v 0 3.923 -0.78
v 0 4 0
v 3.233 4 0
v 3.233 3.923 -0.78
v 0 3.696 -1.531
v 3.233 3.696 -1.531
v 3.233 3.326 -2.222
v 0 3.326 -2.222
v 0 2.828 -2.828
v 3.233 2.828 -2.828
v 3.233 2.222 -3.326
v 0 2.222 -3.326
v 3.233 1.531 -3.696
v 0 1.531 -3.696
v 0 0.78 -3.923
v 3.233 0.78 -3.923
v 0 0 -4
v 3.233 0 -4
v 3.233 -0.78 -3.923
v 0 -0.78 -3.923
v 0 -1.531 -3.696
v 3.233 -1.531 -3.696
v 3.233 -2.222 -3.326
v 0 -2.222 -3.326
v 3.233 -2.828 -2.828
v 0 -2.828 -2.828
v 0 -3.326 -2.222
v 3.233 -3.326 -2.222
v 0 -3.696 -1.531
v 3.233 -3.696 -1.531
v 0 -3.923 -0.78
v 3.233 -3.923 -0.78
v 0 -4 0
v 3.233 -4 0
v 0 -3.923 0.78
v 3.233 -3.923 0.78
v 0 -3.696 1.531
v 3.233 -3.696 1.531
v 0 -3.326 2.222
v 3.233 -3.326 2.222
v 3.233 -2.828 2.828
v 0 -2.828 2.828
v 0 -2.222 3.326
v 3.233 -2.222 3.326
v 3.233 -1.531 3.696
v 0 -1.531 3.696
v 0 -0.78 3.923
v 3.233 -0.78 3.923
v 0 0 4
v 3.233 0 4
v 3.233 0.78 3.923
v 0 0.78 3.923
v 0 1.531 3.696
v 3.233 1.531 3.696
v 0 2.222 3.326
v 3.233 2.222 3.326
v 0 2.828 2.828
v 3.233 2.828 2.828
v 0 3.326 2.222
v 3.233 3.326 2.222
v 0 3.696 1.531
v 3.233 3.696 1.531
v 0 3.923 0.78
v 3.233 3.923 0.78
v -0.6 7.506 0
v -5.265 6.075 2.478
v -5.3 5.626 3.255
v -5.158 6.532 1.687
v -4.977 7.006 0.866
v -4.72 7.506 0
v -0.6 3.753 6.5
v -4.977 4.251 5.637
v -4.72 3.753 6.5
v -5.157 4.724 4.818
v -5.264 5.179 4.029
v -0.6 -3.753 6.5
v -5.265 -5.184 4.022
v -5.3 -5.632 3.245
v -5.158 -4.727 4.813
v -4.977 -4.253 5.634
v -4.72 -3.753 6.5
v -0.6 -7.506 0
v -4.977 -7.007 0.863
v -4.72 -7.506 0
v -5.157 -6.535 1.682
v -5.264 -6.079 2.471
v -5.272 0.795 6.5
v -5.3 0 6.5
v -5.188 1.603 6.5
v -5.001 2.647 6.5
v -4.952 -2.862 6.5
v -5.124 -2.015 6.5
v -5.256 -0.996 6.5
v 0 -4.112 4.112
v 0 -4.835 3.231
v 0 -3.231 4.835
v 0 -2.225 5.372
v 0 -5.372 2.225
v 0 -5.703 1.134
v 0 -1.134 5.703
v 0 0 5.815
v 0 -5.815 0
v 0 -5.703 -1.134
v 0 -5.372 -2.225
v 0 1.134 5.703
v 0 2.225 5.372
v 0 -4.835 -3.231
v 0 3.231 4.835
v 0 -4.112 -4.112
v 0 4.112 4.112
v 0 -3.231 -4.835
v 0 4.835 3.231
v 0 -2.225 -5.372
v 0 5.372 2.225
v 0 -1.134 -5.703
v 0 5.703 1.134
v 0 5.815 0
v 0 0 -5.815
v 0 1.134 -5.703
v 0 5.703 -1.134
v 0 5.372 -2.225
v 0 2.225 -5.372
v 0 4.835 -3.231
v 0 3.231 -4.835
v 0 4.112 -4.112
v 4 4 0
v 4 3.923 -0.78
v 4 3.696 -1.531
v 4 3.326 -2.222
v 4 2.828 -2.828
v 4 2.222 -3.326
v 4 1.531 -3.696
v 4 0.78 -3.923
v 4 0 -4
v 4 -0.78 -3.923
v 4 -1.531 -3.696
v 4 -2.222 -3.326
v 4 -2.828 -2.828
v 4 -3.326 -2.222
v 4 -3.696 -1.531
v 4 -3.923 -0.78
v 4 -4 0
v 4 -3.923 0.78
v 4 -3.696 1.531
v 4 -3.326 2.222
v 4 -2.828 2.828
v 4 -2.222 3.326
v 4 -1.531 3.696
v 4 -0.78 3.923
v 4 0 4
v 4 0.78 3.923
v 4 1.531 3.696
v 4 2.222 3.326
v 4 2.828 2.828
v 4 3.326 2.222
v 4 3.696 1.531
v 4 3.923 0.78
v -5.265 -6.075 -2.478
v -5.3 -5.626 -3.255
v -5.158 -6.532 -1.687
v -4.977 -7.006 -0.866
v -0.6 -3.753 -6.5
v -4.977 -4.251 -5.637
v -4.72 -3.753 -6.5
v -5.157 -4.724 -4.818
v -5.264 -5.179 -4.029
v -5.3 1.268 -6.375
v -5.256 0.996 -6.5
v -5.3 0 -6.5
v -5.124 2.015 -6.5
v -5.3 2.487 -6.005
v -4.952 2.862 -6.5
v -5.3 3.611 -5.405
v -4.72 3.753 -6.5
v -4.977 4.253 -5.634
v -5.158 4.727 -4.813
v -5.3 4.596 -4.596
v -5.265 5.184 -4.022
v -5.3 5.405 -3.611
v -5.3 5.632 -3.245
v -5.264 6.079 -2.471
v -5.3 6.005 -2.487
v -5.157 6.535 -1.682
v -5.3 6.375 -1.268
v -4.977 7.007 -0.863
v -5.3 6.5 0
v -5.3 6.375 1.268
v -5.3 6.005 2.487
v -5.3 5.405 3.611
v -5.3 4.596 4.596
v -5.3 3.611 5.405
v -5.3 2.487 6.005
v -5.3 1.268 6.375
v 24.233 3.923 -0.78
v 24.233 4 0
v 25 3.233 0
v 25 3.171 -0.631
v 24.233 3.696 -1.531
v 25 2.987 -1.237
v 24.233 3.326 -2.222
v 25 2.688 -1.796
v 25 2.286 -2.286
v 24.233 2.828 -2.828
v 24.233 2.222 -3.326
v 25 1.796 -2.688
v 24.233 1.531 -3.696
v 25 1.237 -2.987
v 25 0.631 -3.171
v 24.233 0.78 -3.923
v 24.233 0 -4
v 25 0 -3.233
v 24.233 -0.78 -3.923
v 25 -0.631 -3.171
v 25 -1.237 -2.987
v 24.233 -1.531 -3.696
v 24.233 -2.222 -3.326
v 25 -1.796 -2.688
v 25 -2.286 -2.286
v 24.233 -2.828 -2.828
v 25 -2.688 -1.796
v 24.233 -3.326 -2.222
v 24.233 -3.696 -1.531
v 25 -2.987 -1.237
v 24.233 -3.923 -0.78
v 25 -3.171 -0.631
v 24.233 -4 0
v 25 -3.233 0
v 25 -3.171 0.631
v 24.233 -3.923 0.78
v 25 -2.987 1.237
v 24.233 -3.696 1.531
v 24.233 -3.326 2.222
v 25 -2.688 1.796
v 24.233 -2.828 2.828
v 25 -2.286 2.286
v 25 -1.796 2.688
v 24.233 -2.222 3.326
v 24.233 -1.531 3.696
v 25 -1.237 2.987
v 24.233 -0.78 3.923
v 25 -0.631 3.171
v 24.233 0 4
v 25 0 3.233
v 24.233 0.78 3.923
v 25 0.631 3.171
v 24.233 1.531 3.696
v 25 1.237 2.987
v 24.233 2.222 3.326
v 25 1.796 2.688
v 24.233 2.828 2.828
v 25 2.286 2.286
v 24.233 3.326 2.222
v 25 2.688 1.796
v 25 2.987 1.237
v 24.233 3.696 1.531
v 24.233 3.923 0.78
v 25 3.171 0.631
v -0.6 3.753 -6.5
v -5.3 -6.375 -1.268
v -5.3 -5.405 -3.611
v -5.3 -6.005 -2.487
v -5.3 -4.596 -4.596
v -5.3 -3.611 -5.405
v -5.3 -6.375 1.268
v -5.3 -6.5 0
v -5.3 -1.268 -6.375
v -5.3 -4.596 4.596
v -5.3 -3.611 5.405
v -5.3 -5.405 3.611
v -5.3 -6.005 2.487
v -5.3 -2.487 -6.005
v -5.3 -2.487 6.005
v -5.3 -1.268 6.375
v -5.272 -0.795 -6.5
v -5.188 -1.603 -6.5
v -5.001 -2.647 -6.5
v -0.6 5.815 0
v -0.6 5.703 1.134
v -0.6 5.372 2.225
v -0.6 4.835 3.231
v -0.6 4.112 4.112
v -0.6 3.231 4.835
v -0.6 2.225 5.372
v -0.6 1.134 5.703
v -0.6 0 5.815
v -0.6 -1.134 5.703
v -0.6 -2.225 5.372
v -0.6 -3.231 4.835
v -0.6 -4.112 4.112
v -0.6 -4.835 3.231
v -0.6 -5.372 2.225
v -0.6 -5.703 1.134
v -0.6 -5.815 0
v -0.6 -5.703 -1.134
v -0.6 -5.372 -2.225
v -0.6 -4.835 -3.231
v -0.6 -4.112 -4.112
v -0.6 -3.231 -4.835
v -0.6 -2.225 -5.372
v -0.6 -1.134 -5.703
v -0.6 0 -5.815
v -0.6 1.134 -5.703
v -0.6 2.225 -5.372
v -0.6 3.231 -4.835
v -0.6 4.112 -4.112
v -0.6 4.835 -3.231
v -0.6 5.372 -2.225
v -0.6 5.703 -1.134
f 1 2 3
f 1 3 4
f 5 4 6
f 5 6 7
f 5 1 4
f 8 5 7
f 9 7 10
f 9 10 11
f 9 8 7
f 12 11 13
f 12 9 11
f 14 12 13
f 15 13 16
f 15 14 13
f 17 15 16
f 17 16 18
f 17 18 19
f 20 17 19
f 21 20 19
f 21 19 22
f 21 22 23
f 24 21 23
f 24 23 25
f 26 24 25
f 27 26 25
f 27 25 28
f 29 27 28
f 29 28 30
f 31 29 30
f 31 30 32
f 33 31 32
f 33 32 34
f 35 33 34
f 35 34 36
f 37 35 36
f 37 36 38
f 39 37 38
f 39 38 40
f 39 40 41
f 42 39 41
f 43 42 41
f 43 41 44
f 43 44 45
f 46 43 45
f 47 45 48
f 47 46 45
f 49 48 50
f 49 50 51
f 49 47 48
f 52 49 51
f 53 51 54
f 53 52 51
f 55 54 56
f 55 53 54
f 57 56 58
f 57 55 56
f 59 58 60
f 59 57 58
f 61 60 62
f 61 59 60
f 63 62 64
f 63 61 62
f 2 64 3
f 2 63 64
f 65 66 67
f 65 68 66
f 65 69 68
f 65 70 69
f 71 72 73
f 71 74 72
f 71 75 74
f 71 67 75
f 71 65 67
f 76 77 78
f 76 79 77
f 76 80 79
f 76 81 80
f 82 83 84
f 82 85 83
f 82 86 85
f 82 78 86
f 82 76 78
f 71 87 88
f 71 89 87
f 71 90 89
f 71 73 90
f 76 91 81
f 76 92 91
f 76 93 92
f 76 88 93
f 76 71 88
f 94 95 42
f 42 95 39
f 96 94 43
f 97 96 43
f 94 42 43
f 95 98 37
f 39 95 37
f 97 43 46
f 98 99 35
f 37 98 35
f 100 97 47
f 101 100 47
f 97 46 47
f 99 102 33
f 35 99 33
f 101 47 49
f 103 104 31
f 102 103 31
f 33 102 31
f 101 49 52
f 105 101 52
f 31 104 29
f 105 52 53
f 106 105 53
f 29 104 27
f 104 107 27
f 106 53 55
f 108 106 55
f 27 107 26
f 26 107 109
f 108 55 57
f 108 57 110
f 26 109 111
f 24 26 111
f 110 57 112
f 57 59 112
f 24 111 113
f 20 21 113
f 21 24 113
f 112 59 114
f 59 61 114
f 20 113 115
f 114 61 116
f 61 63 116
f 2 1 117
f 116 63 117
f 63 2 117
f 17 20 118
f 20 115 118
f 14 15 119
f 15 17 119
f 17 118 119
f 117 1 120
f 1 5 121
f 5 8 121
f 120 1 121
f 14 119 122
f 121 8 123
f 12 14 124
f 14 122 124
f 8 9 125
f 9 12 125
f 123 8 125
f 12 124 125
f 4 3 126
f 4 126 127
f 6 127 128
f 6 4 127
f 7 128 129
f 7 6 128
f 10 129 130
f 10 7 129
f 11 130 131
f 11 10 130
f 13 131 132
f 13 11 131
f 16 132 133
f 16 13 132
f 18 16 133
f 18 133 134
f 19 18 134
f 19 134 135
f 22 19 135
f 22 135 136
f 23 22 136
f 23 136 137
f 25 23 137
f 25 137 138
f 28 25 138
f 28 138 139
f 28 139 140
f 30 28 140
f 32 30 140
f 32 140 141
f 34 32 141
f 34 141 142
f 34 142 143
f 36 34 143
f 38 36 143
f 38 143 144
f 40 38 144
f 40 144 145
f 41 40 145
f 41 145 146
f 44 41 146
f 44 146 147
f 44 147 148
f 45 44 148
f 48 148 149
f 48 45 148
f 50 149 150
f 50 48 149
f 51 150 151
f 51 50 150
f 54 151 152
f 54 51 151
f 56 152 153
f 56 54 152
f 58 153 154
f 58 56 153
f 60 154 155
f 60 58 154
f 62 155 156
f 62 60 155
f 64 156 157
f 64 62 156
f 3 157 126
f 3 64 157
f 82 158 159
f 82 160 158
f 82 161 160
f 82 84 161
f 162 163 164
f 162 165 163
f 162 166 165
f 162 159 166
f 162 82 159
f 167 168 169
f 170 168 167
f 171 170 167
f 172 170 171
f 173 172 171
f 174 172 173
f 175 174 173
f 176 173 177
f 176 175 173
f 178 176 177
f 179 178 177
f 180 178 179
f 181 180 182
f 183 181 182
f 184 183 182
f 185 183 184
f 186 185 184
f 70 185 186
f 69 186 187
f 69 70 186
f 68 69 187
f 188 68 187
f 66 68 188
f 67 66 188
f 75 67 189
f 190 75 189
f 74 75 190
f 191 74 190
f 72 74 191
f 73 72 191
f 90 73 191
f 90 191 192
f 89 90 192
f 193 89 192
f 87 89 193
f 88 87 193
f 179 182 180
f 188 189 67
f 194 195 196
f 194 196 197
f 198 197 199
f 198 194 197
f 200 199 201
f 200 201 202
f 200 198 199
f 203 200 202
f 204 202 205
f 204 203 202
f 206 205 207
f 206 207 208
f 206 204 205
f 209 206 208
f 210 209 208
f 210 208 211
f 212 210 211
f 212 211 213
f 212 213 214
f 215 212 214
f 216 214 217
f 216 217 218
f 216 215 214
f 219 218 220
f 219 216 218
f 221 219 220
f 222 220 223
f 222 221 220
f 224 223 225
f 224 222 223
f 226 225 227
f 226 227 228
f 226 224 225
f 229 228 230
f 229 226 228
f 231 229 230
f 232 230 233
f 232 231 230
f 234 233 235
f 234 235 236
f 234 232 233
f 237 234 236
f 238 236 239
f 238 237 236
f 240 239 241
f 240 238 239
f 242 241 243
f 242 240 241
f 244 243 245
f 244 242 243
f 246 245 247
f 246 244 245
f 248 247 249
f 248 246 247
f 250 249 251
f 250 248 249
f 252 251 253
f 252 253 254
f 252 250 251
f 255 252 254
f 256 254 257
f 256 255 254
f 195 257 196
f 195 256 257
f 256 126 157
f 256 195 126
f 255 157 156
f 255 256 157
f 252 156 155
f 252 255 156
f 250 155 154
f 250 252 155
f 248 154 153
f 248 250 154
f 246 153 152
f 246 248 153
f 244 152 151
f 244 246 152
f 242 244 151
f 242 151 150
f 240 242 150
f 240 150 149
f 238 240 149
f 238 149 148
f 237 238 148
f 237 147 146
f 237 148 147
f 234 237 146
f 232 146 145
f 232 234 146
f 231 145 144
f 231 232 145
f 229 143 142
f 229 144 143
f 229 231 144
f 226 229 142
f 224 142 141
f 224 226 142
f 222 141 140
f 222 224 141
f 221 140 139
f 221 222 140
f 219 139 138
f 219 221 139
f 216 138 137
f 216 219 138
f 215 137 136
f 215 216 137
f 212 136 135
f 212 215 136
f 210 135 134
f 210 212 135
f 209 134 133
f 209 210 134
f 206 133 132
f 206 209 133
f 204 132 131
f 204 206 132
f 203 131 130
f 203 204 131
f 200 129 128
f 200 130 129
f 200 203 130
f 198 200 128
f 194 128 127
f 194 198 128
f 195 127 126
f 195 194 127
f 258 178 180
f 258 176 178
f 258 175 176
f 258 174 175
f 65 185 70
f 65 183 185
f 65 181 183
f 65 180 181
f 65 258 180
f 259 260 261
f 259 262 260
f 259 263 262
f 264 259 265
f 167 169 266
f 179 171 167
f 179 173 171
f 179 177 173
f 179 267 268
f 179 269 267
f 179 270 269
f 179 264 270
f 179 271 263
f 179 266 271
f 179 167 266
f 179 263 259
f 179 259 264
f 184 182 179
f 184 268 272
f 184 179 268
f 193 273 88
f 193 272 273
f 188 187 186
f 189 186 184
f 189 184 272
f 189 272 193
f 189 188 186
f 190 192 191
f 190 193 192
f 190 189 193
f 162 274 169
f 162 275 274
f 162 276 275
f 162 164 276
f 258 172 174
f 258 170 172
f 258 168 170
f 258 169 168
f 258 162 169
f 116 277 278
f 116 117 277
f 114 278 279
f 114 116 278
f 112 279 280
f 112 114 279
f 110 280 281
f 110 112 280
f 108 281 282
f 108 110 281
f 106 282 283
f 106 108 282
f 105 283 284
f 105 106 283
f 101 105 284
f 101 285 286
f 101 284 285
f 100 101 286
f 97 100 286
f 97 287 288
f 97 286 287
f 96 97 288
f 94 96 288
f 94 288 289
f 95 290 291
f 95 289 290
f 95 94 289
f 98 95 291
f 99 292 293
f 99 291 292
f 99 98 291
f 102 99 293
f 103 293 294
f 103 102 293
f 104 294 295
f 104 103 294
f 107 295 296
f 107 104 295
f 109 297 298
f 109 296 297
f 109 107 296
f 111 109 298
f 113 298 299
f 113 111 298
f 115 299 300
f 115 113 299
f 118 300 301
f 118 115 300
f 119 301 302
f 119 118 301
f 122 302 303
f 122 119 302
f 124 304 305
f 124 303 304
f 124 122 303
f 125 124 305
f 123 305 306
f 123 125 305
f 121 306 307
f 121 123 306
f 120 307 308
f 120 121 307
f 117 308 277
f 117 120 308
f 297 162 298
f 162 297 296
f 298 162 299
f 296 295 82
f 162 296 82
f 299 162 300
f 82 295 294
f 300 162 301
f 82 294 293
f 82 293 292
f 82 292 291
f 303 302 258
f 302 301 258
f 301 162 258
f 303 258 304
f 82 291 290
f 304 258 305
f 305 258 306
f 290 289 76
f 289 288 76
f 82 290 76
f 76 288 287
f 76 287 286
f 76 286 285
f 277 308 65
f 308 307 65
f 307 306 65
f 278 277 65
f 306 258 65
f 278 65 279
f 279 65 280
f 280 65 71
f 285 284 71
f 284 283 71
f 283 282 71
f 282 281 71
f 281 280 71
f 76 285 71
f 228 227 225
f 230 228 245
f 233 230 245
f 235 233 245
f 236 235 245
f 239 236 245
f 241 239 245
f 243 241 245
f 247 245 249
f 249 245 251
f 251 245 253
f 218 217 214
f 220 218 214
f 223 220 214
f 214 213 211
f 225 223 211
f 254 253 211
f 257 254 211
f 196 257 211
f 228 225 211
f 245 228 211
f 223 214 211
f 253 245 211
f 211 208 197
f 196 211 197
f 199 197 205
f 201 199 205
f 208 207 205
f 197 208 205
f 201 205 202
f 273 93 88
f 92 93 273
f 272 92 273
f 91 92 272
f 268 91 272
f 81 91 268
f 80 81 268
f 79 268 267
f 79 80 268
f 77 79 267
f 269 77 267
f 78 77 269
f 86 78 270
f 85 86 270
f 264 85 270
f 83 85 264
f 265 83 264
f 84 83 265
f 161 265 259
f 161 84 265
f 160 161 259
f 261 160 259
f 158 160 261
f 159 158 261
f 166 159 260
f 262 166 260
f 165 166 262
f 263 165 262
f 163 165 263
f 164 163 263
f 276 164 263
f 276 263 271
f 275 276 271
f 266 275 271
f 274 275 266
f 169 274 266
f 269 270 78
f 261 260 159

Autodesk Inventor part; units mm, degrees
ref_plane "YZ Plane" through (0, 0, 0) normal (1, 0, 0) x (0, 1, 0)
ref_plane "XZ Plane" through (0, 0, 0) normal (0, 1, 0) x (-1, 0, 0)
ref_plane "XY Plane" through (0, 0, 0) normal (0, 0, 1) x (1, 0, 0)
sketch "Sketch1" plane through (0, 0, 0) normal (0, 0, 1) x (1, 0, 0)
  line L0 (0, 5.815) -> (0, 4)
  line L1 (4, 4) -> (25, 4)
  line L2 (25, 4) -> (25, 0)
  line L3 (25, 0) -> (-0.6001, 0)
  line L4 (-3.0501, 0) -> (32.65, 0) projected
  line L5 (-0.6001, 0) -> (-0.6001, 5.815)
  line L6 (-0.6001, 5.815) -> (0, 5.815)
  line L7 (4, 4) -> (3.2331, 4)
  line L8 (3.2331, 4) -> (0, 4)
  line L9 (0, -0.344) -> (0, 4.472) projected
  dimension "d0" = 25
  dimension "d1" = 21
  dimension "d2" = 8
  dimension "d9" = 0.6001
  dimension "d10" = 11.63
  dimension "d13" = 0.7669
  dimension "d14" = 8
revolve "Body" add sketch "Sketch1" angle 360 about axis through (25, 0, 0) along (-1, 0, 0)
sketch "Sketch2" plane through (-0.6001, 0, 0) normal (-1, 0, 0) x (0, 0, 1)
  line L0 (0, 7.5056) -> (6.5, 3.7528)
  line L1 (6.5, 3.7528) -> (6.5, -3.7528)
  line L2 (6.5, -3.7528) -> (0, -7.5056)
  line L3 (0, -7.5056) -> (-6.5, -3.7528)
  line L4 (-6.5, -3.7528) -> (-6.5, 3.7528)
  line L5 (-6.5, 3.7528) -> (0, 7.5056)
  point P0 (0, 0)
  point P1 (0, 0)
  dimension "d11" = 13
extrude "Head" add sketch "Sketch2" along normal blind 4.7
sketch "Sketch4" plane through (0, 0, 0) normal (0, 0, 1) x (1, 0, 0)
  line L0 (-5.3001, 6.5) -> (-5.3001, 7.5056)
  line L1 (-5.3001, 7.5056) -> (-4.7195, 7.5056)
  line L2 (-4.7195, 7.5056) -> (-5.3001, 6.5)
  line L3 (-3.8001, 0) -> (0.3999, 0) projected
  line L4 (-0.6001, 7.5056) -> (-5.3001, 7.5056) projected
  line L5 (-5.3001, 3.7528) -> (-5.3001, 7.5056) projected
  dimension "d5" = 30
  dimension "d19" = 13
revolve "Chamfer1" cut sketch "Sketch4" angle 360 about axis through (-10, 0, 0) along (1, 0, 0)
thread "Thread" size "M8x1.25" class "6g" standard "ISO Metric profile" length 21
chamfer "Chamfer2" distance 0.7668 distance2 0.7669 1 edges at (25, -4, 0) measured on face at (25, 0.998, -0.8842)
equation "\"d0\" = NLG"
equation "\"d1\" = GEL"
equation "\"d2\" = GD"
equation "\"d10\" = SD2"
equation "\"d14\" = BDM"
equation "\"d11\" = SW"
equation "\"d3\" = KOH - SD"
equation "\"d5\" = ANG1"
equation "\"d19\" = SW0"
equation "\"d15\" = GEL"
equation "\"d6\" = -0.5 * SPD + 0.5 * GD"
equation "\"NLG\" = 25"
equation "\"GD\" = NND"
equation "\"BDM\" = NND"
equation "\"KOH\" = 5.3"
equation "\"GEL\" = 21"
equation "\"SW\" = 13"
equation "\"SW0\" = SW"
equation "\"SPD\" = NND - 1.2269 * TPU"
equation "\"SD2\" = 11.63"
equation "\"SD\" = 0.6"
equation "\"ANG1\" = 30deg"
equation "\"GAL\" = 0.61345 * TPU"
equation "\"GUL\" = 0.61345 * TPU"
equation "\"RR\" = 0.4"
equation "\"d20\" = -NLG"
equation "\"TOA\" = 30deg"
equation "\"PTC\" = TPU"
equation "\"GD1\" = THREADDIA - 1.2269 * TPU"
equation "\"TPU\" = 1.25"
equation "\"THREADDIA\" = 8"
equation "\"SDH\" = SD2"
equation "\"E0\" = 15.015"
equation "\"NND\" = 8"
equation "\"SDHG\" = 4"
properties part number "ISO 4017 - M8 x 25" material "Steel, Mild"
